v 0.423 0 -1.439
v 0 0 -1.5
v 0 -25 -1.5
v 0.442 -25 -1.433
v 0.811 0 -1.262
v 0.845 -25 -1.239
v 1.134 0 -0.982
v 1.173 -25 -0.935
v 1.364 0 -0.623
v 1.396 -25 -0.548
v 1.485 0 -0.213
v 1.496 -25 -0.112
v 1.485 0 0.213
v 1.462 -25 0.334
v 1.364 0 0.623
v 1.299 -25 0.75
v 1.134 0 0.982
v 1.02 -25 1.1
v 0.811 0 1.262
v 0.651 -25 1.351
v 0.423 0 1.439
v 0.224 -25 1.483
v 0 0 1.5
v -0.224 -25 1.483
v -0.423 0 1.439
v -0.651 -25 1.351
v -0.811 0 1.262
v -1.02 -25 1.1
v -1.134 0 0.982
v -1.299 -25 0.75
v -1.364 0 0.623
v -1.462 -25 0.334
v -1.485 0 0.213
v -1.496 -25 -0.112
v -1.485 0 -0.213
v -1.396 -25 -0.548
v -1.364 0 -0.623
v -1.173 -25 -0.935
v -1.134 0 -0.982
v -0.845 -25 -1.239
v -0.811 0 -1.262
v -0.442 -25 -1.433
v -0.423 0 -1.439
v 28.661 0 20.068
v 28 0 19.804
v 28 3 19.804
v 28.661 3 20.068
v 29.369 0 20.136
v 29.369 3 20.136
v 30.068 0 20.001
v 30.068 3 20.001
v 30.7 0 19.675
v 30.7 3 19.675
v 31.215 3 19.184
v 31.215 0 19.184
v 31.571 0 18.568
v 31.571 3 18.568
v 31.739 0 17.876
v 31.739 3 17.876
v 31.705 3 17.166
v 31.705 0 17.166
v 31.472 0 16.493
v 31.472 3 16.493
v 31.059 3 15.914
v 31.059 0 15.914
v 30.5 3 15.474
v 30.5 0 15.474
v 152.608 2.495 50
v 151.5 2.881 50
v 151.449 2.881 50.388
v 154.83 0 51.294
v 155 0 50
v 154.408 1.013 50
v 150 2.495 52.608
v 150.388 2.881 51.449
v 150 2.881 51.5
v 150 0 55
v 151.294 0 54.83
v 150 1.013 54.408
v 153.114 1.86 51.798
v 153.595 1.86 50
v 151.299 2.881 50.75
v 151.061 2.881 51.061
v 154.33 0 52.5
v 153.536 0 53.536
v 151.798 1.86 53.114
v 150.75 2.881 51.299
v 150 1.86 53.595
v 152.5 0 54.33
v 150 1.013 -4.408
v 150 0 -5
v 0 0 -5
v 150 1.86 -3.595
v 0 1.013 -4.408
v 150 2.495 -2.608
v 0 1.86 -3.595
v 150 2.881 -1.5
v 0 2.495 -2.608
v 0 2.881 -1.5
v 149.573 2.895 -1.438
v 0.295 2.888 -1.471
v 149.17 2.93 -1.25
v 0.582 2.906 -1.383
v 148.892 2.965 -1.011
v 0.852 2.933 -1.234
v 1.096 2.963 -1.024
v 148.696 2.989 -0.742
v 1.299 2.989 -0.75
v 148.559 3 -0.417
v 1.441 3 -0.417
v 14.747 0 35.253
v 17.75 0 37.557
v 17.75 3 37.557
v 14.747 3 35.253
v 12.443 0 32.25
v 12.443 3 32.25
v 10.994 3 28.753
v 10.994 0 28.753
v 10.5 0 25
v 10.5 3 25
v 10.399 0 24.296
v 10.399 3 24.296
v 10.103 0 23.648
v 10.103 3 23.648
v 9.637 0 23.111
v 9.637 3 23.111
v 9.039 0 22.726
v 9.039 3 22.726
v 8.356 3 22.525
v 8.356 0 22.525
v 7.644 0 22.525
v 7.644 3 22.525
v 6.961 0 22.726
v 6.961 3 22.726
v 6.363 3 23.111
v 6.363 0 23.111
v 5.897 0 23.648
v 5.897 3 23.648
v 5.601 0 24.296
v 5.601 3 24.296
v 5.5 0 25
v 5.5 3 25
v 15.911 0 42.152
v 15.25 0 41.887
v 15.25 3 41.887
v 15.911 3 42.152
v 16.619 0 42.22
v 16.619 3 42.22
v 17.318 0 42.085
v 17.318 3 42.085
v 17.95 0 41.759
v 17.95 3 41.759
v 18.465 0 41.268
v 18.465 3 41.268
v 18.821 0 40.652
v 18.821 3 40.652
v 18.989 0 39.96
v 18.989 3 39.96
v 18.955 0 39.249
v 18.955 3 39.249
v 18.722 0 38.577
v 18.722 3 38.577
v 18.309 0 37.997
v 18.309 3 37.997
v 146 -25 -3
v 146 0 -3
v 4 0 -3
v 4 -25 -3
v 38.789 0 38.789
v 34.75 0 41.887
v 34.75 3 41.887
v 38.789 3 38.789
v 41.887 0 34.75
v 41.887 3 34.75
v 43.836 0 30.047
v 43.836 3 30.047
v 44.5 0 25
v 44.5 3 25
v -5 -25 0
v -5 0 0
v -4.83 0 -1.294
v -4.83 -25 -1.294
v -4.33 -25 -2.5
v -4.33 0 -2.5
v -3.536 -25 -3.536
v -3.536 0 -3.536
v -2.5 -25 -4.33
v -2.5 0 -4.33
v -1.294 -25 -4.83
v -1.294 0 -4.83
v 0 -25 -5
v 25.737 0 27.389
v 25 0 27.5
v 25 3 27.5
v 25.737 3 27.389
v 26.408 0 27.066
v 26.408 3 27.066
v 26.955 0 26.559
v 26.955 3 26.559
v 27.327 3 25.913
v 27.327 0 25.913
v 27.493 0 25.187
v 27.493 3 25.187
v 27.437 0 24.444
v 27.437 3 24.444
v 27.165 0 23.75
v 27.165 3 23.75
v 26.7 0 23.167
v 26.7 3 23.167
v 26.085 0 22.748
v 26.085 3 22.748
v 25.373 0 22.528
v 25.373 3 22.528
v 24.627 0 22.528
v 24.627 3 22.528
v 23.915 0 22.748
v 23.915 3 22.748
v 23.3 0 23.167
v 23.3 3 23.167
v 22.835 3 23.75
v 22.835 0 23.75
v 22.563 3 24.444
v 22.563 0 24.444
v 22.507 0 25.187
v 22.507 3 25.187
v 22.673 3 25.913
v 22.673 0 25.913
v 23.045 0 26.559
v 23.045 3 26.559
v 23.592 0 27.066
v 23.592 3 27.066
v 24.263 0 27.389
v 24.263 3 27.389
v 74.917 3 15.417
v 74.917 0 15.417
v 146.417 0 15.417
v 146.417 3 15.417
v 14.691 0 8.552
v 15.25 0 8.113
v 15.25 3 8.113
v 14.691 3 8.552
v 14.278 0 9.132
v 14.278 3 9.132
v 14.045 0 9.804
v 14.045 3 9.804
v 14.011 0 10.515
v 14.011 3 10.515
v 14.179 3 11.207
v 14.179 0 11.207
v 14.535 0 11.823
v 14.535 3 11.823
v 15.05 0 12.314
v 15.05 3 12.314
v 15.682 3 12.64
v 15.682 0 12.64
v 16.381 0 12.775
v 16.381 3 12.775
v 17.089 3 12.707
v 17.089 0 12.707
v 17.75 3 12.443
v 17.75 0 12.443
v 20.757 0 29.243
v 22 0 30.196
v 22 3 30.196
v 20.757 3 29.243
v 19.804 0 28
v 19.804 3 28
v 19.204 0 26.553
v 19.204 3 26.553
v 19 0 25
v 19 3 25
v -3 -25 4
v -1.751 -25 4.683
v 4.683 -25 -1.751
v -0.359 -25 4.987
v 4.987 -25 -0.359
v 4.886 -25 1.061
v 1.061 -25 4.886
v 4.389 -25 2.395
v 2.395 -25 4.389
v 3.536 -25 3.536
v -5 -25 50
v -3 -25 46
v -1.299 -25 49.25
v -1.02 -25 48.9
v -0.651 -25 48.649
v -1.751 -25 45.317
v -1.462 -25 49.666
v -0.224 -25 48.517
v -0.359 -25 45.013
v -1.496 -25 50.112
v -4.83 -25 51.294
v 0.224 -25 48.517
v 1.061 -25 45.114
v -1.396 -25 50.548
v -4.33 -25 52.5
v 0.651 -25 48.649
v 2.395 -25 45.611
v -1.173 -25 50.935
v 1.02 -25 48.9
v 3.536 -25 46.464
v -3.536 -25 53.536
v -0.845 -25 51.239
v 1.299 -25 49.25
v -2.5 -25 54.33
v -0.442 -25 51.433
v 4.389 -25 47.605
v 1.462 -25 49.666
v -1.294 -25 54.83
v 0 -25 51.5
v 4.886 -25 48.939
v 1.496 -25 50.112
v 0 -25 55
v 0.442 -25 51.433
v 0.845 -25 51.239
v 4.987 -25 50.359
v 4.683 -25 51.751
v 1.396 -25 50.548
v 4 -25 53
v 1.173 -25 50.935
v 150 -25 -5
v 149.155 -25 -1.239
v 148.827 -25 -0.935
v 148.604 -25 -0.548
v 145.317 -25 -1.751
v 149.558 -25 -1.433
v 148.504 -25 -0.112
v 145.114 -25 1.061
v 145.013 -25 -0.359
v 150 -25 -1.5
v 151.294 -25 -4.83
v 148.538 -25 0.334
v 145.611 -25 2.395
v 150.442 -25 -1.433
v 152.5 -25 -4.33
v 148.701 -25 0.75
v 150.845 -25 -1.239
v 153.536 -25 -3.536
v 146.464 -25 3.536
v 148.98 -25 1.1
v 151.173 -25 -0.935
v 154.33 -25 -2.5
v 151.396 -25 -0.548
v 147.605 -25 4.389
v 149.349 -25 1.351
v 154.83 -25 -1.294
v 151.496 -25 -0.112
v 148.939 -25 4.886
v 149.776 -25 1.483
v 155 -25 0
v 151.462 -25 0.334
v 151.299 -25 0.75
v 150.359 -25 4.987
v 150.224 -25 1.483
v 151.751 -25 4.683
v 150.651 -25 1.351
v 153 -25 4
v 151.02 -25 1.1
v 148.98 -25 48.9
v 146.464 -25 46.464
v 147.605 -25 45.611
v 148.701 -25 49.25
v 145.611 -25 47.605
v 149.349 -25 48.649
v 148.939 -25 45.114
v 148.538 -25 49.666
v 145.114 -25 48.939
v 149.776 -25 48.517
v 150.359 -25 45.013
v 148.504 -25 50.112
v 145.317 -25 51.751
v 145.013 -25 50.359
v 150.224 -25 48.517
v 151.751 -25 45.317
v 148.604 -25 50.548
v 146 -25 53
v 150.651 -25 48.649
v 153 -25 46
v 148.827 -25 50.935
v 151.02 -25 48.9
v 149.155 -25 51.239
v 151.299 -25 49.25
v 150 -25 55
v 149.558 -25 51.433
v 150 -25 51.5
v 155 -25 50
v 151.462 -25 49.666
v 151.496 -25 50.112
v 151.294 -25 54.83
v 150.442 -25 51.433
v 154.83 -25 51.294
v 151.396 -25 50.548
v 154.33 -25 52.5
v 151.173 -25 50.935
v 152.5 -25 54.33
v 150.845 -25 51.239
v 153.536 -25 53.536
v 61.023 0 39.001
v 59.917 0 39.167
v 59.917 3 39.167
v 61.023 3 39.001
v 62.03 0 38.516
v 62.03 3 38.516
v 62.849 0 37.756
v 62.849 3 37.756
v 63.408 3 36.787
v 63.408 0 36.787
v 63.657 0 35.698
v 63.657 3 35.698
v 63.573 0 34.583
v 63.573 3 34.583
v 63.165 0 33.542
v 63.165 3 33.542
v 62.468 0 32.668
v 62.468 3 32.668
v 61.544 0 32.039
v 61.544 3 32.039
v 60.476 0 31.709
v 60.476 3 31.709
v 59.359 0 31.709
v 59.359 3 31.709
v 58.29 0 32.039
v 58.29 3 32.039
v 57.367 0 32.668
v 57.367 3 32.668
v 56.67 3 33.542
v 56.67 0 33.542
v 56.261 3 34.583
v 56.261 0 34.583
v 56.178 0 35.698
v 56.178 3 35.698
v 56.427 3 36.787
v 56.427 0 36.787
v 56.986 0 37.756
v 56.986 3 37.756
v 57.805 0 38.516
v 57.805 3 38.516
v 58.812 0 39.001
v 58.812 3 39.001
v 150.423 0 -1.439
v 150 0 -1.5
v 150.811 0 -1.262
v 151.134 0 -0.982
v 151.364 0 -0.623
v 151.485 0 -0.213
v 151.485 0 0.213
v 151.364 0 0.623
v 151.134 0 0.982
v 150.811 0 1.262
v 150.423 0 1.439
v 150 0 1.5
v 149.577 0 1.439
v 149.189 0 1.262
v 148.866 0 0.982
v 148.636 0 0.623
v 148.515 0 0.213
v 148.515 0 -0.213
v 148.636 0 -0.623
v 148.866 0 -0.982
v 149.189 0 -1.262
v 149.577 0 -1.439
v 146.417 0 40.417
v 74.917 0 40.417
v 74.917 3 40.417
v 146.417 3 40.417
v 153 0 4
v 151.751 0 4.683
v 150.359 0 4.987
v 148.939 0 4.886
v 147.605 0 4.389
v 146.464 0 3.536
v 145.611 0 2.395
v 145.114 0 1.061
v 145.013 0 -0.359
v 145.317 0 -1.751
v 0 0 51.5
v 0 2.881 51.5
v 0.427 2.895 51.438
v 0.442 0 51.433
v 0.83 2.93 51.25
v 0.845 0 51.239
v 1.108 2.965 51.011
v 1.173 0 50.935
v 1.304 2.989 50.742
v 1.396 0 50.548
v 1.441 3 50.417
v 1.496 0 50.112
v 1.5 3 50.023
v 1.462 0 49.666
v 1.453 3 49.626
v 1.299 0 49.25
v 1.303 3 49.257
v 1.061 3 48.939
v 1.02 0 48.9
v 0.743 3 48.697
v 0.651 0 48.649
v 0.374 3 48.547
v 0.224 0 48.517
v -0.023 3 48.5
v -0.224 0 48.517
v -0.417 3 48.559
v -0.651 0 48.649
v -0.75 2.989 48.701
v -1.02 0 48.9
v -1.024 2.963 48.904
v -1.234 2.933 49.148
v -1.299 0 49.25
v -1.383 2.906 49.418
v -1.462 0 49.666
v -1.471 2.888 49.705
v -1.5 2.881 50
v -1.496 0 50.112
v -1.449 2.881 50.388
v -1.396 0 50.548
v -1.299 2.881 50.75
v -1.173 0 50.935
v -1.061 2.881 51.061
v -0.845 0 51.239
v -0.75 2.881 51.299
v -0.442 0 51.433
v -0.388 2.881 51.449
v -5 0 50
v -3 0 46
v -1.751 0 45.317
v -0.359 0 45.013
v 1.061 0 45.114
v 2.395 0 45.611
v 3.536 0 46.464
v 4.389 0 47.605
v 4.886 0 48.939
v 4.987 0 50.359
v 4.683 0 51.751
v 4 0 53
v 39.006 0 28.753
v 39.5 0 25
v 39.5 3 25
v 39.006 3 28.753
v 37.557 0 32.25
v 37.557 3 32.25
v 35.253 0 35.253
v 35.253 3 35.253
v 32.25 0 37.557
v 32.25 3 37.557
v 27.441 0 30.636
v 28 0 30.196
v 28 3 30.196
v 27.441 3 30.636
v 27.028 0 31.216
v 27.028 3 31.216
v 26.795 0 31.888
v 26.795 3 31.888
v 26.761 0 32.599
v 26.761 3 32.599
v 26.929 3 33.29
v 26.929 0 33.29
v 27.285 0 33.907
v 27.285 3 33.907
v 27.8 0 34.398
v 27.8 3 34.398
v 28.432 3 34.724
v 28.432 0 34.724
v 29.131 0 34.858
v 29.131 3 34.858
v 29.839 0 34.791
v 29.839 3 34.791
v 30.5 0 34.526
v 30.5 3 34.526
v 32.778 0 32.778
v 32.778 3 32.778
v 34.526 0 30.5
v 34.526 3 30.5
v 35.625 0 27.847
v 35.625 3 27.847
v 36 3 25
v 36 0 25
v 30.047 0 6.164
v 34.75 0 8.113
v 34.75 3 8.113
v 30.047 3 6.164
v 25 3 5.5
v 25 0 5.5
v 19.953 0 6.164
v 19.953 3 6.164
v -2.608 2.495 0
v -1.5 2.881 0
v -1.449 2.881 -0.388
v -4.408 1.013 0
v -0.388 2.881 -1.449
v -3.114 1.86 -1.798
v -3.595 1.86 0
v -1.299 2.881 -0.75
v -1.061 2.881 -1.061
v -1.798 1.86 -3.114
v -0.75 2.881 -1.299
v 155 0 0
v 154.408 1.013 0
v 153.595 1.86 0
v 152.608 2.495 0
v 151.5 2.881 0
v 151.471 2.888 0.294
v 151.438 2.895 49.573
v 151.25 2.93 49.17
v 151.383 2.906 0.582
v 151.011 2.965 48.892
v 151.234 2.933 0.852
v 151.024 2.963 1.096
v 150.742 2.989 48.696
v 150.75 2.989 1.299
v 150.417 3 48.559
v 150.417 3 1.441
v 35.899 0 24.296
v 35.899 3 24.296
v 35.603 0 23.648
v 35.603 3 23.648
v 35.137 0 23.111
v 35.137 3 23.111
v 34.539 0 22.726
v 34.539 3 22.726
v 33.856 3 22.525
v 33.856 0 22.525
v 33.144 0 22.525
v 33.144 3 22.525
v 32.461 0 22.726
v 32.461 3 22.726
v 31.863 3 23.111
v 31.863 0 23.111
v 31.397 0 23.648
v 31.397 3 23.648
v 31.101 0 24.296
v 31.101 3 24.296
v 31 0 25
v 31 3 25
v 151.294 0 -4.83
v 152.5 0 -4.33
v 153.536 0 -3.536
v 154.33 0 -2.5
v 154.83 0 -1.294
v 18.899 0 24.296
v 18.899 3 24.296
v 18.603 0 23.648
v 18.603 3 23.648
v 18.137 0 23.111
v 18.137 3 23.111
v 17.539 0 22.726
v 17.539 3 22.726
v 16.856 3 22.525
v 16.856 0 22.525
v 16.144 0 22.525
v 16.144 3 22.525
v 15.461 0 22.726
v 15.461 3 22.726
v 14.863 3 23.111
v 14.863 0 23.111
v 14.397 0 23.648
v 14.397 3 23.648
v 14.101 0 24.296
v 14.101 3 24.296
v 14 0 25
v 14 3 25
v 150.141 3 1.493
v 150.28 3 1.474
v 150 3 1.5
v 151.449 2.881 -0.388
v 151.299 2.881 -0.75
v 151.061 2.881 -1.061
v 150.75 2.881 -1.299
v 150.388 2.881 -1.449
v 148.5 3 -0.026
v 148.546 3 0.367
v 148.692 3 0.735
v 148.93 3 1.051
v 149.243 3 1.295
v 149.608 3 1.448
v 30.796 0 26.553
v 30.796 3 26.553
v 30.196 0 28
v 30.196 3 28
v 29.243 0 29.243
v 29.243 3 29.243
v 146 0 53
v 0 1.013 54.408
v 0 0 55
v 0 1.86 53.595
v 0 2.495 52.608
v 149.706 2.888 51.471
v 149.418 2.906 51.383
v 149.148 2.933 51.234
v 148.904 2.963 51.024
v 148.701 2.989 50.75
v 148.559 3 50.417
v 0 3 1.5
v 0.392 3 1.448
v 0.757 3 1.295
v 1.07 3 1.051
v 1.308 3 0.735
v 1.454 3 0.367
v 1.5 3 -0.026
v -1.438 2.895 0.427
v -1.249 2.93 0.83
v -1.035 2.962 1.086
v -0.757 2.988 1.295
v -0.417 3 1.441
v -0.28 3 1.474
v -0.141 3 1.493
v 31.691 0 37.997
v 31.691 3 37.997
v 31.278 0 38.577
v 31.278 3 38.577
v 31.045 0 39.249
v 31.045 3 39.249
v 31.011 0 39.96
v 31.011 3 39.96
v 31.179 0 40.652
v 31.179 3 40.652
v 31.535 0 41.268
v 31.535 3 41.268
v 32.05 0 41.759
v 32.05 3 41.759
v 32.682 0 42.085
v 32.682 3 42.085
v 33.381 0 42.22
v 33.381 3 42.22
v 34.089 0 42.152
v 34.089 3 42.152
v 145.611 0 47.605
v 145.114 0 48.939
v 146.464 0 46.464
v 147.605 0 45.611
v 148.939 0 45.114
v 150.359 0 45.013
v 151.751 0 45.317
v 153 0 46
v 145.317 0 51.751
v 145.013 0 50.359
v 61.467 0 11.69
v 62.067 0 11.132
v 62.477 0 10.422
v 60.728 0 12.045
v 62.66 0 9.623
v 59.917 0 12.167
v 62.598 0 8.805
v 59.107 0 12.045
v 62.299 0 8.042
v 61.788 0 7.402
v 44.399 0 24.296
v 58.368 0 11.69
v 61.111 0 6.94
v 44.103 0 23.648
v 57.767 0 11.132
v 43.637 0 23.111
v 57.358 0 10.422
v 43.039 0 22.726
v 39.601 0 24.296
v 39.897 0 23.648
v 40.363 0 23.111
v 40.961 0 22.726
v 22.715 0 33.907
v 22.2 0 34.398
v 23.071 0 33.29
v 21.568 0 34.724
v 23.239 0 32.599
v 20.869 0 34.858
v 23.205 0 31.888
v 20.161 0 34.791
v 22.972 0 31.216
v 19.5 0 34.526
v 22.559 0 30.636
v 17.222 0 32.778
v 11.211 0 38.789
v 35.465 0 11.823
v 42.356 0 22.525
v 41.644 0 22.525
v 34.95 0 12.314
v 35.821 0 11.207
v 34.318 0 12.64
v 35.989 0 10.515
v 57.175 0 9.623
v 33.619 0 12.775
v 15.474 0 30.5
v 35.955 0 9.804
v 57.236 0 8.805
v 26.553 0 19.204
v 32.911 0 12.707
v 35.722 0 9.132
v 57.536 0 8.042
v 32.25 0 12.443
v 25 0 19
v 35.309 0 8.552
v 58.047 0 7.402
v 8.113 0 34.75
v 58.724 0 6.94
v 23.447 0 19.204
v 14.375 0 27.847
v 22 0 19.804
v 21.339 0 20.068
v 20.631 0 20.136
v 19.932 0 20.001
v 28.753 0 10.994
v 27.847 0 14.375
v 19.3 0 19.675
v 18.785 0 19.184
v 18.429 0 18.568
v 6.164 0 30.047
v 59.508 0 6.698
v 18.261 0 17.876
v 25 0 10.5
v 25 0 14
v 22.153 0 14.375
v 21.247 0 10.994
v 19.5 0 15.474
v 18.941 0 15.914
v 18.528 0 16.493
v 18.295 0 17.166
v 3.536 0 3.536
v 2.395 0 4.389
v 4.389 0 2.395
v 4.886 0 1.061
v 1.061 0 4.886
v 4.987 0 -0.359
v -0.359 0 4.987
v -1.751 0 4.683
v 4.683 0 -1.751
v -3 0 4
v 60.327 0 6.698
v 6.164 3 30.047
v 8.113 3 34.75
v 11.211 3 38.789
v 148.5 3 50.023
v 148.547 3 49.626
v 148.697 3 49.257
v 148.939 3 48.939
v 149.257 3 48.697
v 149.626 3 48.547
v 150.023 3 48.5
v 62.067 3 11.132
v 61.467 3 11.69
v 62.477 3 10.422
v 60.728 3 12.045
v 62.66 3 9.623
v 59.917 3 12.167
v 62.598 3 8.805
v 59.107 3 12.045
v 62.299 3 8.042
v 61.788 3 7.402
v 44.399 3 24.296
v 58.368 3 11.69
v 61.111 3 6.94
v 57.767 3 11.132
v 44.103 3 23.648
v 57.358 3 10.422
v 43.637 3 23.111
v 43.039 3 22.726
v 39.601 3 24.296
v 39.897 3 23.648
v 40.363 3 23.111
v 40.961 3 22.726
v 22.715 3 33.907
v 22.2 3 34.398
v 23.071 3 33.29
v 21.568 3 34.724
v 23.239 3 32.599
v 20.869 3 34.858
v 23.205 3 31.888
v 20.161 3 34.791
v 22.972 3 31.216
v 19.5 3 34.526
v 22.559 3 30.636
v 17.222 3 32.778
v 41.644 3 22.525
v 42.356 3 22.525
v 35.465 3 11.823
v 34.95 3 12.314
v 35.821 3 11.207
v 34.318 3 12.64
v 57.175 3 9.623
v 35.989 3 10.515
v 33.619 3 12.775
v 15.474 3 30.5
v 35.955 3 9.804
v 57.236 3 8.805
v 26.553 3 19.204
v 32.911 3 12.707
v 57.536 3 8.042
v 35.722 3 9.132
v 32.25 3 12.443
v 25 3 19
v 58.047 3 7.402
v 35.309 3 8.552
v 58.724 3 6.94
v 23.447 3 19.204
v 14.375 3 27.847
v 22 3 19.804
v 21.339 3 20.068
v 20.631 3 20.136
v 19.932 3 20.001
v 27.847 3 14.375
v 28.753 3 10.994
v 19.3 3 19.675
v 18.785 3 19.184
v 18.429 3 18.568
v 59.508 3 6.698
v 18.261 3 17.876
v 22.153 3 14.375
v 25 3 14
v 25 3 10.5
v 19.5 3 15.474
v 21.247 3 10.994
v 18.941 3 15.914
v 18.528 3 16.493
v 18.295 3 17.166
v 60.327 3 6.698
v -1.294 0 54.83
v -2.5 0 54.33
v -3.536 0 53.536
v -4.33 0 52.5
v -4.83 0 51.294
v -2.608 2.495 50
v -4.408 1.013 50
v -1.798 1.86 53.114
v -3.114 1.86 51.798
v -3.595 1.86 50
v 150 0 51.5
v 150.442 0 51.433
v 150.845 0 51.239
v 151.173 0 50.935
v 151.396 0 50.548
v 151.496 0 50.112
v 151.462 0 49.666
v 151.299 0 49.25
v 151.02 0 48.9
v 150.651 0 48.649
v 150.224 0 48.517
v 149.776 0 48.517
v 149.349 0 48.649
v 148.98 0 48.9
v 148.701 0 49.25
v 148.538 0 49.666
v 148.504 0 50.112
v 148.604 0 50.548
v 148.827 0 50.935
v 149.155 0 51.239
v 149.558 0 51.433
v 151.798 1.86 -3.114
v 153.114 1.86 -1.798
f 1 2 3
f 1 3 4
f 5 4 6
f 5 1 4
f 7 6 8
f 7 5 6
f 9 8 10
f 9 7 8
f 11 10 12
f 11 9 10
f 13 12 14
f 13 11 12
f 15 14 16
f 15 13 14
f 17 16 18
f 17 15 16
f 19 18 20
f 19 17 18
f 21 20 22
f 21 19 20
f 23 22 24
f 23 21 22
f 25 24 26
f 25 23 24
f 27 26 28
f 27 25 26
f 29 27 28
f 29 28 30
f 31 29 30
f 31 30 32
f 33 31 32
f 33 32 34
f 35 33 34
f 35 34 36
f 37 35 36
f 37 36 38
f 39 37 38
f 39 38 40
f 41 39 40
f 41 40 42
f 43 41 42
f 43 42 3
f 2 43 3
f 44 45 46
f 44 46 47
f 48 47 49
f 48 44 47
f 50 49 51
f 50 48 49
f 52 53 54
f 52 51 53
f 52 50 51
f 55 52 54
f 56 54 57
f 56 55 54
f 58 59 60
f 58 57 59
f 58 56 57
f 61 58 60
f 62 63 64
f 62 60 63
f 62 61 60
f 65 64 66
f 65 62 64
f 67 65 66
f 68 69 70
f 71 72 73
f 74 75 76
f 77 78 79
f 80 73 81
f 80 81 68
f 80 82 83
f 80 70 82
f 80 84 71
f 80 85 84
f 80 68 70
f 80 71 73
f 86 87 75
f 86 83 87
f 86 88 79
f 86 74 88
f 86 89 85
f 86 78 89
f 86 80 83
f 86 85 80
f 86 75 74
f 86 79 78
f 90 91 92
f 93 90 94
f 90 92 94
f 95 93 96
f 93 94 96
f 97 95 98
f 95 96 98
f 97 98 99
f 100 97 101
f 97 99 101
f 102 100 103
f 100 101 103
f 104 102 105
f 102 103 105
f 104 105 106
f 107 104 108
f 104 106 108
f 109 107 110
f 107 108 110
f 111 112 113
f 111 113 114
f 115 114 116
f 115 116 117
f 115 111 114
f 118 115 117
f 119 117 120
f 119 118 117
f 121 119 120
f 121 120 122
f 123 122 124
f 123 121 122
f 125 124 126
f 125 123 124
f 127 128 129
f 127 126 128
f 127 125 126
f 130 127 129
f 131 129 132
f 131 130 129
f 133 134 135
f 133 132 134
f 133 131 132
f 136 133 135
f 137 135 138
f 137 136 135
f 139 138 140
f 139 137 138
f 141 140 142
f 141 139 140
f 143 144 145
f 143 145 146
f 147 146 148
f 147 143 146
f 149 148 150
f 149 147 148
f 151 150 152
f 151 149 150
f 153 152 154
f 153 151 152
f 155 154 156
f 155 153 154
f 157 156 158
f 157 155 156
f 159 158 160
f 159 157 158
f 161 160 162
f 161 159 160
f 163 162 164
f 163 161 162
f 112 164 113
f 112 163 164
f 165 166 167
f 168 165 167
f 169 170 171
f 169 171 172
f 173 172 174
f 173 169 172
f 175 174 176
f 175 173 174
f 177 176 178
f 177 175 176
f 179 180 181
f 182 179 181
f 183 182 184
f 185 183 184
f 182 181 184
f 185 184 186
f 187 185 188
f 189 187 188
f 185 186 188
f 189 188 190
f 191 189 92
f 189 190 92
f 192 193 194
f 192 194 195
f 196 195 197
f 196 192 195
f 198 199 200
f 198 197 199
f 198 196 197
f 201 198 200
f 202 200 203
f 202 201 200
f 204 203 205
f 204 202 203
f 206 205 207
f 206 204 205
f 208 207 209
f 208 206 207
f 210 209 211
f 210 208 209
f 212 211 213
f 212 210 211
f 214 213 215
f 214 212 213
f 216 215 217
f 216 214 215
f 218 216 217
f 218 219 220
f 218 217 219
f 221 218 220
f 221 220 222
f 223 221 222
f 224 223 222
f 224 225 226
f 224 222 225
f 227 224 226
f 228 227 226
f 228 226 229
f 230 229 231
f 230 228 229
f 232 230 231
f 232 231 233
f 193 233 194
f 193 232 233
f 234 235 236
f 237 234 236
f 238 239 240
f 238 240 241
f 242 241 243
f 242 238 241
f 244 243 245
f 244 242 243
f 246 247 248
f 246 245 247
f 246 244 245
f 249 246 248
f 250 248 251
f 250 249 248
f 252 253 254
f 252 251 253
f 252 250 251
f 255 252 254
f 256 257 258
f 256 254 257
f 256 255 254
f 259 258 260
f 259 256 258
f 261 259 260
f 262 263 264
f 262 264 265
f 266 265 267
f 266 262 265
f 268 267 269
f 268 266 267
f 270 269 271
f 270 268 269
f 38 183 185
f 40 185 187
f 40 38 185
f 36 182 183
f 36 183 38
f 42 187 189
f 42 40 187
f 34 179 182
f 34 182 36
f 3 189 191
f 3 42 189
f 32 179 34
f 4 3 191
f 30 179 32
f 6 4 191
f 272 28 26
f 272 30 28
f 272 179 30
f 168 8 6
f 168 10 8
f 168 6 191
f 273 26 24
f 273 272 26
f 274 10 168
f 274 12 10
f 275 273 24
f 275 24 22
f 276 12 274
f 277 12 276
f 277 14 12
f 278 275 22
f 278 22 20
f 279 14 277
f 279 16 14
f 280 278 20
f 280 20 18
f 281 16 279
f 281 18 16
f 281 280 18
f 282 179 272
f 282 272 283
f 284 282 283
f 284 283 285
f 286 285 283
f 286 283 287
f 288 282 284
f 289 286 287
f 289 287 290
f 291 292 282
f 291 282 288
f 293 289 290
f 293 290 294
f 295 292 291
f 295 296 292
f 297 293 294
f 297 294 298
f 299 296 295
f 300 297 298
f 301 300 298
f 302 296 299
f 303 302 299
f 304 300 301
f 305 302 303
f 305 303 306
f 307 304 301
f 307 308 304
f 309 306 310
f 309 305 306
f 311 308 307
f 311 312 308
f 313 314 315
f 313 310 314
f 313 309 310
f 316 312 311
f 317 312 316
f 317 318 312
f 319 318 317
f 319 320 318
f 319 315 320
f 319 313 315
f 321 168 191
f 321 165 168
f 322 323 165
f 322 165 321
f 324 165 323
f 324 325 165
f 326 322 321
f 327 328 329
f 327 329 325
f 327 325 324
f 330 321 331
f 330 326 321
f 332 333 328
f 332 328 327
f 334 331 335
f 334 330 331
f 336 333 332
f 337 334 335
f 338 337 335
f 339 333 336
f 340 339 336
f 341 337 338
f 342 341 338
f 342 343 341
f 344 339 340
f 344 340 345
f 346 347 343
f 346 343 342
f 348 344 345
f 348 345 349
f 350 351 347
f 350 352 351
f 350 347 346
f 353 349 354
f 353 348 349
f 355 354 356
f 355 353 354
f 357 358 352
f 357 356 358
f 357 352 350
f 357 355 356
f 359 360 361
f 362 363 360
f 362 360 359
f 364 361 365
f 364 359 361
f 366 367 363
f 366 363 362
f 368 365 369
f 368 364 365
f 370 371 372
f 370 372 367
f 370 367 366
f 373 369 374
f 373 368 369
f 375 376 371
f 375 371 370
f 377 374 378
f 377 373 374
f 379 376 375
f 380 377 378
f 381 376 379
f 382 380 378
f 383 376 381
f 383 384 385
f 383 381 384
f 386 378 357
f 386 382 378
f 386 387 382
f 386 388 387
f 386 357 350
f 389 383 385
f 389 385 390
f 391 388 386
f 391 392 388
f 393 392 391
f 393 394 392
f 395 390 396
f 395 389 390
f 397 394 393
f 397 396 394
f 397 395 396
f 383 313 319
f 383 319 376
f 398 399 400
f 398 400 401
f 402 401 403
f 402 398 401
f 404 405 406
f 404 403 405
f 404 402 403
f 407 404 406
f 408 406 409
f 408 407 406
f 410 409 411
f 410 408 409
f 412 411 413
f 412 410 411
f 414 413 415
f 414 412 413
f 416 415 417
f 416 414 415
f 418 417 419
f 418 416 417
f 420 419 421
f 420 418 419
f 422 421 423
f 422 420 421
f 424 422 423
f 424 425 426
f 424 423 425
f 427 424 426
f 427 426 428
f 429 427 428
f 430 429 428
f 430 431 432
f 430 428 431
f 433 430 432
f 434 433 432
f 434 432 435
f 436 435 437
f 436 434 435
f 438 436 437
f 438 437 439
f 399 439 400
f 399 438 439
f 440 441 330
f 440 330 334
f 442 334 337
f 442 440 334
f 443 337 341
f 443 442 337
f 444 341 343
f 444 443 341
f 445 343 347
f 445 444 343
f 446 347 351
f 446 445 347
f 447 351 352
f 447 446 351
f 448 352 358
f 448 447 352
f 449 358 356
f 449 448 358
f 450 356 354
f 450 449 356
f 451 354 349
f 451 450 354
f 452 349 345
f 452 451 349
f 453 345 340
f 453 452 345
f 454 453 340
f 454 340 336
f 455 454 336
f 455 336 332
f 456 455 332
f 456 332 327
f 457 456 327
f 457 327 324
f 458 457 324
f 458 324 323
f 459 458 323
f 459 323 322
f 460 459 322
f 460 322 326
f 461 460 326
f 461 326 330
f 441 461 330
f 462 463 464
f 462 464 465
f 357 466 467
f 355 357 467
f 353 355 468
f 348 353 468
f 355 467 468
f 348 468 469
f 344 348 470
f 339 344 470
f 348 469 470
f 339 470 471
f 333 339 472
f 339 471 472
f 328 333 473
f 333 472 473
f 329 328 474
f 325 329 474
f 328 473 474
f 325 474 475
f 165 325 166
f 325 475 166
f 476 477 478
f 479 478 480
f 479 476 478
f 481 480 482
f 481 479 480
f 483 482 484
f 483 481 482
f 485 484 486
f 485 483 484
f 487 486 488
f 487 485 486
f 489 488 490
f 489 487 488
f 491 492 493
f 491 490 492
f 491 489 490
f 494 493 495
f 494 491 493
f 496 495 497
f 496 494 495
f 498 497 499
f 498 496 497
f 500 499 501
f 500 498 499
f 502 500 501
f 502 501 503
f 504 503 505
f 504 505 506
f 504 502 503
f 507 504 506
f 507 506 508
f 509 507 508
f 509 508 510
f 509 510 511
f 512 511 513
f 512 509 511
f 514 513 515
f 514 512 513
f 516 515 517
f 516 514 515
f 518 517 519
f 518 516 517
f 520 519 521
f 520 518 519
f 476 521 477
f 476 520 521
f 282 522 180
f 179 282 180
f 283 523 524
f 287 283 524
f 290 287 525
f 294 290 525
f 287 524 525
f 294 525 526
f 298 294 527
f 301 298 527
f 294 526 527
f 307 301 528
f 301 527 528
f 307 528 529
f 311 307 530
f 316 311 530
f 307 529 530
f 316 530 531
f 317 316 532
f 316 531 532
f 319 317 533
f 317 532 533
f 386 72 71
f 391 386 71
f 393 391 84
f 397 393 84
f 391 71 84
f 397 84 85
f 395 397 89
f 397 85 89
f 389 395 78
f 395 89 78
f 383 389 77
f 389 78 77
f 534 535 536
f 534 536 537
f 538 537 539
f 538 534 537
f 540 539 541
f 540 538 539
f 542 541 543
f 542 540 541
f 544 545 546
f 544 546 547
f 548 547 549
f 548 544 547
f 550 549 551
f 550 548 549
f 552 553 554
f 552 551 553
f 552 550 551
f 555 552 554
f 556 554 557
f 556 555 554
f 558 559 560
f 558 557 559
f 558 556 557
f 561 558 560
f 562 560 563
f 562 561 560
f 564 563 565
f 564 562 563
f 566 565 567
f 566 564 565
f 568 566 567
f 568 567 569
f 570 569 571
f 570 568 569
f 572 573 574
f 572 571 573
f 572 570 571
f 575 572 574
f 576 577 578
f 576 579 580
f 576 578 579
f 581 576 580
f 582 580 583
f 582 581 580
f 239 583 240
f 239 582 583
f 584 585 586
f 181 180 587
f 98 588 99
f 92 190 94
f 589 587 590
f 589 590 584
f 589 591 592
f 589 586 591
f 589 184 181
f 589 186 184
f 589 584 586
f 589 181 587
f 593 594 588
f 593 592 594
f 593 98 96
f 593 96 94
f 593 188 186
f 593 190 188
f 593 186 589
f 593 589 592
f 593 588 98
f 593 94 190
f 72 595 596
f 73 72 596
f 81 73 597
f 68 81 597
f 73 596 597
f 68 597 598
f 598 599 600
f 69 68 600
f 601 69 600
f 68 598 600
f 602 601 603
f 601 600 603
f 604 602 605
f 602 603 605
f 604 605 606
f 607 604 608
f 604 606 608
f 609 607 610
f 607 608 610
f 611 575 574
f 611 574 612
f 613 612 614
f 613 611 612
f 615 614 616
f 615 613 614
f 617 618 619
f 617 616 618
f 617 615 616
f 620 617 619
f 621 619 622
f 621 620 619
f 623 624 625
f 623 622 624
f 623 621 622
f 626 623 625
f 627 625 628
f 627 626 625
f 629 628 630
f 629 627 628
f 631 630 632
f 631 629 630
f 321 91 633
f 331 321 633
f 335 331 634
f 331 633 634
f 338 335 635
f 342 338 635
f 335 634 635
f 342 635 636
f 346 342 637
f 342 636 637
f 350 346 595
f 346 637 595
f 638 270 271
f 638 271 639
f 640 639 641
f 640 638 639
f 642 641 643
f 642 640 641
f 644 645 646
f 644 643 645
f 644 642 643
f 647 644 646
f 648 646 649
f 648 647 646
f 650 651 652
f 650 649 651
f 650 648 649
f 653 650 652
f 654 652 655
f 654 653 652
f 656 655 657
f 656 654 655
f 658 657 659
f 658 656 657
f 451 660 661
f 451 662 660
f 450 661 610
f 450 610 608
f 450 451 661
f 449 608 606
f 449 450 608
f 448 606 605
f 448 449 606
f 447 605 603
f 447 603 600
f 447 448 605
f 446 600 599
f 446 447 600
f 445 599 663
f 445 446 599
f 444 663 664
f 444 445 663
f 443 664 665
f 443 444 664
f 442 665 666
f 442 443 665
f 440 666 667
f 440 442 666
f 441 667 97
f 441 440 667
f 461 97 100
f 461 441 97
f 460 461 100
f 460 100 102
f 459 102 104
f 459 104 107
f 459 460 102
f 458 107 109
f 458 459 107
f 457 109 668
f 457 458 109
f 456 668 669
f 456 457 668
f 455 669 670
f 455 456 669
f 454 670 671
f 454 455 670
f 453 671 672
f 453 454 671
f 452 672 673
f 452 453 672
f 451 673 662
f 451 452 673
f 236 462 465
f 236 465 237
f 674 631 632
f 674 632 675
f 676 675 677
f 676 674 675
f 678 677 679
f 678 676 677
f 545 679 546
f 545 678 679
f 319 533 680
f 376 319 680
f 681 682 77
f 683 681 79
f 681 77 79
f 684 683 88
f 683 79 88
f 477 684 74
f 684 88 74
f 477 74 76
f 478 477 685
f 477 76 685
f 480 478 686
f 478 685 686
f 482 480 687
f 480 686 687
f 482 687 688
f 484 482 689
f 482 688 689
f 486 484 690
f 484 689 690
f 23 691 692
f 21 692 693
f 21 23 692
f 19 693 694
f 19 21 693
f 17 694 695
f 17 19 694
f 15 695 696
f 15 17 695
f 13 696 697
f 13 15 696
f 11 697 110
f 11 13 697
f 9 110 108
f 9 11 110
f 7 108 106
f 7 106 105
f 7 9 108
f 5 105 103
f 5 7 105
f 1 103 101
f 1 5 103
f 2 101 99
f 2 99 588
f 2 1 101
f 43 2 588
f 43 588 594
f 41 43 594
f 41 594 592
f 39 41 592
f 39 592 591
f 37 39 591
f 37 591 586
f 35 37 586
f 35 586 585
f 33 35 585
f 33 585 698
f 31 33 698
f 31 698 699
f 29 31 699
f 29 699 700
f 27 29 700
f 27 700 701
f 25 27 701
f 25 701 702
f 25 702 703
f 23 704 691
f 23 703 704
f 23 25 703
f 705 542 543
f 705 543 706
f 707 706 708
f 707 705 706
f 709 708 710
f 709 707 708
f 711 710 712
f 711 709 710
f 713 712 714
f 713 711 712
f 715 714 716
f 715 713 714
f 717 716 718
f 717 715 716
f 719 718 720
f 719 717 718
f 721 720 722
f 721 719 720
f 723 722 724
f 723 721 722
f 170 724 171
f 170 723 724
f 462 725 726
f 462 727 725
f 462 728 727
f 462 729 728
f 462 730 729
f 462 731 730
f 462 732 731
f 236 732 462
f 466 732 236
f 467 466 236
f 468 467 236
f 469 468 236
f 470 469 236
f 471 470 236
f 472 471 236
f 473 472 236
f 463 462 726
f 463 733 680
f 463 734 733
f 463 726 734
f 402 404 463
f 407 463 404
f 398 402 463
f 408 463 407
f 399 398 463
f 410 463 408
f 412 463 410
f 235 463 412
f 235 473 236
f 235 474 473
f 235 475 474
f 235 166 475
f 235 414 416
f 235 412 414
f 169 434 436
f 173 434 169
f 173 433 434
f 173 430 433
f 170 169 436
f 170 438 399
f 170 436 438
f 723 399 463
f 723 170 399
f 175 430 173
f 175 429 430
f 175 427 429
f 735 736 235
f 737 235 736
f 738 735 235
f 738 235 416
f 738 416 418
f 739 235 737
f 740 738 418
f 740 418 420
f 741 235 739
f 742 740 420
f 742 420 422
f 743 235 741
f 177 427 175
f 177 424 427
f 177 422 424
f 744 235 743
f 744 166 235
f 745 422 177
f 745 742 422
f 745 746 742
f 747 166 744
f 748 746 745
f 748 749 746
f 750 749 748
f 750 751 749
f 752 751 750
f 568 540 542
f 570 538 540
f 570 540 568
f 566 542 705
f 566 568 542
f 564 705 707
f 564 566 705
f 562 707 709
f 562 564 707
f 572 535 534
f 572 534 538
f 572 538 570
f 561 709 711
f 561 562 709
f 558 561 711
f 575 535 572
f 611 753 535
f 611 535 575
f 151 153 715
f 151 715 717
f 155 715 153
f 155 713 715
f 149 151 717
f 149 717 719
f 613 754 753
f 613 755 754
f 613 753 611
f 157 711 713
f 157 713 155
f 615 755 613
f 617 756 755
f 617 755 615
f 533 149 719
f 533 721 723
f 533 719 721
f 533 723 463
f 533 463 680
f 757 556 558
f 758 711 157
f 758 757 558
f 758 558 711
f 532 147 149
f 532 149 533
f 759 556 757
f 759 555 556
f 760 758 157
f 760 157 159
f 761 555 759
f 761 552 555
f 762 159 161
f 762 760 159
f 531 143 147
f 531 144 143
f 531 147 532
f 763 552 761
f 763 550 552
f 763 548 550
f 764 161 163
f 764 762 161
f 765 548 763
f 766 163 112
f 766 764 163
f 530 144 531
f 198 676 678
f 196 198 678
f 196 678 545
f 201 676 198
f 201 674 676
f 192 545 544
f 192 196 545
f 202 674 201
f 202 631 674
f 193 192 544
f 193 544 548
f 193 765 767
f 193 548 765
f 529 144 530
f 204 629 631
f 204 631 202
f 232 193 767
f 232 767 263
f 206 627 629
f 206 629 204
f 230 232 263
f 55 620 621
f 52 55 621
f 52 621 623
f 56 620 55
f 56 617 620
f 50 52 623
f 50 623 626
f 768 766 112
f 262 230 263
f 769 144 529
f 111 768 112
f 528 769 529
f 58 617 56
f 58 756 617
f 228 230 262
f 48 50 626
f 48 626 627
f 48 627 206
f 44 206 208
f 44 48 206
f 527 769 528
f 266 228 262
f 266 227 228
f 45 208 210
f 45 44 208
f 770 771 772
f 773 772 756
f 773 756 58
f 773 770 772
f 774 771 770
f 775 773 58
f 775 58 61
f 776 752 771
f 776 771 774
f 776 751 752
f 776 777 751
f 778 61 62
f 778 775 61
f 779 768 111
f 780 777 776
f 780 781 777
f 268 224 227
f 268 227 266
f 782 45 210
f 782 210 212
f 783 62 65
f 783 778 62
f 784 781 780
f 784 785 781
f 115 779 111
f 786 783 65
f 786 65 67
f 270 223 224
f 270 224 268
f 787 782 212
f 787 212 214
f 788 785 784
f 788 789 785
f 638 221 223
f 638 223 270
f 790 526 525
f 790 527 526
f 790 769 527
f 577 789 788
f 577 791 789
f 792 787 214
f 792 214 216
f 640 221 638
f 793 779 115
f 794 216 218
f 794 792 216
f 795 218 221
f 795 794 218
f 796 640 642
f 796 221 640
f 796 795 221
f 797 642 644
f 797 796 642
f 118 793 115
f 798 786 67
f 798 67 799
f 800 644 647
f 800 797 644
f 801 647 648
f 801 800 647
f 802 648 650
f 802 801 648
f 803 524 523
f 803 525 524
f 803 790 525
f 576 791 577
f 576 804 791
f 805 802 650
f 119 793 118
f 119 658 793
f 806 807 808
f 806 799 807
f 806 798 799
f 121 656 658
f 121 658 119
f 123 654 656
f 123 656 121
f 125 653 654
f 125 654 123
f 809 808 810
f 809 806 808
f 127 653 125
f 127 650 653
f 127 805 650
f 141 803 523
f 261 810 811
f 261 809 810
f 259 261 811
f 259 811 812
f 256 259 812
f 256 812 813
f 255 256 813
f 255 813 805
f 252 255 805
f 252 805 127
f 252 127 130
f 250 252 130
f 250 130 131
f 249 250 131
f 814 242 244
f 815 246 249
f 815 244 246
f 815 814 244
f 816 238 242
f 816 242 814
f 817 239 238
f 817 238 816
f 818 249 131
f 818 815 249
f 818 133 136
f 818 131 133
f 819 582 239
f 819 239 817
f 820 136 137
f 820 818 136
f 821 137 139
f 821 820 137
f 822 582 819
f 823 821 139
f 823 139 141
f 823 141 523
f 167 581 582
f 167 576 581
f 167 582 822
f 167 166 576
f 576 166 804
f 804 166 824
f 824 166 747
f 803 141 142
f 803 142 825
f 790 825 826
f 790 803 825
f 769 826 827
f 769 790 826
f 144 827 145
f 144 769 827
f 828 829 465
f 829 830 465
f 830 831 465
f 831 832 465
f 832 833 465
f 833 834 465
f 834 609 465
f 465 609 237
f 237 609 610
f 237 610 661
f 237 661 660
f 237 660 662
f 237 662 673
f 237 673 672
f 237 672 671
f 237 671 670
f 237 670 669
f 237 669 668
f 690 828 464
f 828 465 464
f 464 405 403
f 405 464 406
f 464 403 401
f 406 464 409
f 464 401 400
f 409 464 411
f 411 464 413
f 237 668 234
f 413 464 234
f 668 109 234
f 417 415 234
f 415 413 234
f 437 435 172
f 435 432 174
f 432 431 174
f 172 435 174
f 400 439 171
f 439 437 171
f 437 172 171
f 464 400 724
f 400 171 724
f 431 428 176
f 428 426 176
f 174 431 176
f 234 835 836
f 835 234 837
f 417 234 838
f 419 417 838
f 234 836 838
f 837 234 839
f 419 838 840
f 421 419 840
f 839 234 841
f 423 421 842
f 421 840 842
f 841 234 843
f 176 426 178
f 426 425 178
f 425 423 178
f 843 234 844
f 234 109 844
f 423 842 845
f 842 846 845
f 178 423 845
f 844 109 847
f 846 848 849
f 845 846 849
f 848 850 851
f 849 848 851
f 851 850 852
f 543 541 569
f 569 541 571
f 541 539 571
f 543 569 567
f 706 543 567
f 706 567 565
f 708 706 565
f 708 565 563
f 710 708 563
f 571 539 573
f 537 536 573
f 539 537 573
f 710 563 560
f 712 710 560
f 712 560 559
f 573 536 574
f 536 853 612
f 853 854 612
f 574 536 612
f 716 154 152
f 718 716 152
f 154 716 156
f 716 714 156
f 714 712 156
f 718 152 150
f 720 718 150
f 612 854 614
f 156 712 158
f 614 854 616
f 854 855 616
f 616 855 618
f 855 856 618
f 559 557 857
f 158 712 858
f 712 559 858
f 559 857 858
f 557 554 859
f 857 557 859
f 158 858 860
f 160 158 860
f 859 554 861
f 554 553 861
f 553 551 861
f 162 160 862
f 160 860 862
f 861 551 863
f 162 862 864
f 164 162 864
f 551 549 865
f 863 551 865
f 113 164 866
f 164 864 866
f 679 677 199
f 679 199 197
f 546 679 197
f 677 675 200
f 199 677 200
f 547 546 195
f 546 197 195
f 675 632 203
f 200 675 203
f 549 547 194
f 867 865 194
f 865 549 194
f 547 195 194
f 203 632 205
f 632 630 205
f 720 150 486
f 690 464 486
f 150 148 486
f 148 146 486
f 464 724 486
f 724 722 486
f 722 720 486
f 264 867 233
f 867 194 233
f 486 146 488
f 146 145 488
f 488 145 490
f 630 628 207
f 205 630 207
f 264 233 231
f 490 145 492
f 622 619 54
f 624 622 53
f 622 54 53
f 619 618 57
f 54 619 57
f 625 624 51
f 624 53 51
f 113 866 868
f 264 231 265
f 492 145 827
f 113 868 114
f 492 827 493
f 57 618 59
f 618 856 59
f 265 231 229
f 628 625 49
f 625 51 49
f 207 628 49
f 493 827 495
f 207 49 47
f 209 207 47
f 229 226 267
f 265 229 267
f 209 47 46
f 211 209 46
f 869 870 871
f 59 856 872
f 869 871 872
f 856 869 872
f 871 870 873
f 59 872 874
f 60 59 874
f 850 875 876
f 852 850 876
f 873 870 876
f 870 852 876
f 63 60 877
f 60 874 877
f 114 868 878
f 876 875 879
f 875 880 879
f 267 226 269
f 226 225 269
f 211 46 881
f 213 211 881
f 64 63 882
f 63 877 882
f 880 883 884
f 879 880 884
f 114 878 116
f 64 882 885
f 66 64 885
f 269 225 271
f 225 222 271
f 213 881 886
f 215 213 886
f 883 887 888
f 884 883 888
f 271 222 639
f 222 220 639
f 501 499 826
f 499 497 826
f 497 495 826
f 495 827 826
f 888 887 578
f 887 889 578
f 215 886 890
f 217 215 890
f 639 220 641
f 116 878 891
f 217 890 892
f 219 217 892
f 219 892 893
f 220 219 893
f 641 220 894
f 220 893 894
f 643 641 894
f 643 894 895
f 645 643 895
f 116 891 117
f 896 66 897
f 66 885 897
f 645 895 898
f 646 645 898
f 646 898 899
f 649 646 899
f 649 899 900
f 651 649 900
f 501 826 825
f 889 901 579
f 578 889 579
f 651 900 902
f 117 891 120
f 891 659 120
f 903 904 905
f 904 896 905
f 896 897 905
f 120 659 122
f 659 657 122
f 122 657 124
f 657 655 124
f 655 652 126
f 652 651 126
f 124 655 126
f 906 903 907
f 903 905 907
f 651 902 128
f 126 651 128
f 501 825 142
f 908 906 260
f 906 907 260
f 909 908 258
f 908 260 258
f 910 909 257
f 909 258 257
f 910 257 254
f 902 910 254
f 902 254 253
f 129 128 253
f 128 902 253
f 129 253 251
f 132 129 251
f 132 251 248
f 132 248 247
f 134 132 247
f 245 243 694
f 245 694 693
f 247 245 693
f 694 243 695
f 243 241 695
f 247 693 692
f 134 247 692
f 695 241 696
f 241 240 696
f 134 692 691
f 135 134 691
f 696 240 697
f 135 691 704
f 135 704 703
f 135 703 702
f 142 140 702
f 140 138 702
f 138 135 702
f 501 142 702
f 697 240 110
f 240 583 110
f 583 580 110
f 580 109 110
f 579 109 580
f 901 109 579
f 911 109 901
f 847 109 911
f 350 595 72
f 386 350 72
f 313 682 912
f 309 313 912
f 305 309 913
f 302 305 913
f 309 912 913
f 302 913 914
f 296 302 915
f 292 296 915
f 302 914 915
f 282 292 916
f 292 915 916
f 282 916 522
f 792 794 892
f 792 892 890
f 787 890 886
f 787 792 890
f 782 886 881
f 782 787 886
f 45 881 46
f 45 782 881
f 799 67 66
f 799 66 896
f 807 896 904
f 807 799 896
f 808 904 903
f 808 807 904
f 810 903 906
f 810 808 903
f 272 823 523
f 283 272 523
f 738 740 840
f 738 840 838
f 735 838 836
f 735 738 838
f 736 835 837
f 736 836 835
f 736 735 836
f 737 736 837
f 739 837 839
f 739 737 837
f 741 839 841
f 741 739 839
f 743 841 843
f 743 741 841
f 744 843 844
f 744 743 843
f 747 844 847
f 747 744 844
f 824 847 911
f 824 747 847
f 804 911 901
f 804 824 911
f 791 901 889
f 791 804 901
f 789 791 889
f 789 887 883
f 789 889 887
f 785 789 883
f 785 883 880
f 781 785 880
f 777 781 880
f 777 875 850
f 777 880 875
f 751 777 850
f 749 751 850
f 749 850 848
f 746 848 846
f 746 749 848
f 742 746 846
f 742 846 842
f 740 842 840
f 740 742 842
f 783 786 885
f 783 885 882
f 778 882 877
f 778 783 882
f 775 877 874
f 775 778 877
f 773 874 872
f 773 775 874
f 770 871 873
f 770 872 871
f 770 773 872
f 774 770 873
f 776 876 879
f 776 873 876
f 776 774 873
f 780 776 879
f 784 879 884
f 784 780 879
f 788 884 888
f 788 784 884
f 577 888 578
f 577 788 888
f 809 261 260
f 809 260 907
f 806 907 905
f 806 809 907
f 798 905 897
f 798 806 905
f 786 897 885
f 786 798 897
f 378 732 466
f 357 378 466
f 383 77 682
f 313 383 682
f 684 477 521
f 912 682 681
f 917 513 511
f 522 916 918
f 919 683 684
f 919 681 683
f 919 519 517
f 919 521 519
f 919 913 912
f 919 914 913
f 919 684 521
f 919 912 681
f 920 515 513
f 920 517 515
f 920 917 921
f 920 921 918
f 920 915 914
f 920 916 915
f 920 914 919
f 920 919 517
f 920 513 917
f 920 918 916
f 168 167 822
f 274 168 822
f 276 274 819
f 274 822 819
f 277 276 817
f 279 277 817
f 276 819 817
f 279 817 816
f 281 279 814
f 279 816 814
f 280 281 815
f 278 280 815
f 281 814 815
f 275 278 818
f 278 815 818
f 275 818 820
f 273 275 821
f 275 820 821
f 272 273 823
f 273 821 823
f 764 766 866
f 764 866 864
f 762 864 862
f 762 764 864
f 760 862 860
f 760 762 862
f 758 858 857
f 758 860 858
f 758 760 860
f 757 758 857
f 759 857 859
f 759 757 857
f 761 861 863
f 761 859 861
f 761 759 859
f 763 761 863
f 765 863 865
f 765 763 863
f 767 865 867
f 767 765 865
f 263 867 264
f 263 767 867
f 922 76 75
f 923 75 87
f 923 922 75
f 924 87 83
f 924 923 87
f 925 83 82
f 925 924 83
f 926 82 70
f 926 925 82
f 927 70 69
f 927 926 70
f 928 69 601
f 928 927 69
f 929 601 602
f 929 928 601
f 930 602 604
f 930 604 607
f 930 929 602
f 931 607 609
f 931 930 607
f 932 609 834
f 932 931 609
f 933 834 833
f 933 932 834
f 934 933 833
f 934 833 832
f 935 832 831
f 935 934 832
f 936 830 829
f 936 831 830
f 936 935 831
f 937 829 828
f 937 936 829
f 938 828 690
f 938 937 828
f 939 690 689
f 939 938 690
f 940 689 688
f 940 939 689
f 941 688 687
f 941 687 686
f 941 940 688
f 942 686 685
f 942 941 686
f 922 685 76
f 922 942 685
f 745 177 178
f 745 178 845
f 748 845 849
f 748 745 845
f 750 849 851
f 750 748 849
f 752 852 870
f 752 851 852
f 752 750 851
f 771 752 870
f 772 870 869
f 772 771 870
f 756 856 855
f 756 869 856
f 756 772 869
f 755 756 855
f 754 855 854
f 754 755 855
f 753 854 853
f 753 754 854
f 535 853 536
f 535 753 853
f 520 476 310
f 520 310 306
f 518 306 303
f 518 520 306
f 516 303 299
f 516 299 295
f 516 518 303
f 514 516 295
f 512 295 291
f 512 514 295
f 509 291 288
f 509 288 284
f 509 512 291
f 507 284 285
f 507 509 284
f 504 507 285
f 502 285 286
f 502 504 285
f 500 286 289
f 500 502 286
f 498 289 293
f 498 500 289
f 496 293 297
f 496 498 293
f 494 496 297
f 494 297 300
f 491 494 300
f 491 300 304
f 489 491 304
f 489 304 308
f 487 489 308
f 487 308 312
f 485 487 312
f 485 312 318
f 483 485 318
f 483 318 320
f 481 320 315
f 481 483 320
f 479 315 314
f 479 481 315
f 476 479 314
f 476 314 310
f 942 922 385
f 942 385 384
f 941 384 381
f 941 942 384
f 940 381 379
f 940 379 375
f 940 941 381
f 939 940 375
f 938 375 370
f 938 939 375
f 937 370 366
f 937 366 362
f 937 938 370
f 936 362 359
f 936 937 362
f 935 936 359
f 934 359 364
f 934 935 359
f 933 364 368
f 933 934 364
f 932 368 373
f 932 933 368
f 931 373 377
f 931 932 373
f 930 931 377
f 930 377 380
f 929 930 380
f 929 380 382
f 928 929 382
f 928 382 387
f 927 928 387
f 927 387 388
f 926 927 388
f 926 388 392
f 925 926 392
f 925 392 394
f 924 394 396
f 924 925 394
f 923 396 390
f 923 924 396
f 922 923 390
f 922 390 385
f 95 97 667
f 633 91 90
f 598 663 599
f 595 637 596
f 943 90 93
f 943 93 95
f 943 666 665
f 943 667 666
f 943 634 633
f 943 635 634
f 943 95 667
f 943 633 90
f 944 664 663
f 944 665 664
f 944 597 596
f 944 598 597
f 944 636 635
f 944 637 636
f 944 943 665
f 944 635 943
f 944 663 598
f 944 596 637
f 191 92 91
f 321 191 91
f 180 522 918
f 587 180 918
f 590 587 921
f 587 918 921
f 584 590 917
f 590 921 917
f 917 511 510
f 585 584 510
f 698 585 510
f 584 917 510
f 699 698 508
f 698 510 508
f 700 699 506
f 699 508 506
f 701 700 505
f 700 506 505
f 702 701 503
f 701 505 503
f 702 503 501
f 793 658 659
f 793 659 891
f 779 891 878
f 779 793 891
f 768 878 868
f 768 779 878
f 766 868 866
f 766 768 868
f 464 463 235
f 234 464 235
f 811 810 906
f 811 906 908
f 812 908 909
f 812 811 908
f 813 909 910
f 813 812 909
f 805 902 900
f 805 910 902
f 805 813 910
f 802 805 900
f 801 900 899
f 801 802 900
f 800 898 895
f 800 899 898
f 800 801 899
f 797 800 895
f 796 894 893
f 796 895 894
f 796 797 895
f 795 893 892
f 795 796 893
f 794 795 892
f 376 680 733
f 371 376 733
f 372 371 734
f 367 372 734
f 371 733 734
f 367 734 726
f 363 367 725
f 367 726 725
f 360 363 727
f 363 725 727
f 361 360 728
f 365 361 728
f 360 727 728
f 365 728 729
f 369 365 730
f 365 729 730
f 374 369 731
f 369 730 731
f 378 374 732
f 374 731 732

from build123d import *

# Parameters (mm, degrees)
BOSS_EXTRUDE1_DEPTH     = 3
FILLET1_R               = 5
CUT_EXTRUDE1_DEPTH      = 165.496200564
CUT_EXTRUDE1_DEPTH_BACK = 165.496200564
SKETCH2_R               = 1.5
CUT_EXTRUDE2_DEPTH      = 165.496200694
CUT_EXTRUDE2_DEPTH_BACK = 165.496200694
SKETCH3_R               = 2.5
CUT_EXTRUDE3_DEPTH      = 165.496200694
CUT_EXTRUDE3_DEPTH_BACK = 165.496200694
SKETCH4_R               = 3.75
SKETCH4_R_2             = 2.75
SKETCH4_W               = 71.5
SKETCH4_H               = 25
SKETCH5_R               = 1.5
BOSS_EXTRUDE2_DEPTH     = 25


with BuildPart() as part:
    # Sketch1 → Boss-Extrude1 (new body)
    with BuildSketch(Plane(origin=(0, 0, 0), x_dir=(1, 0, 0), z_dir=(0, 1, 0))):
        with BuildLine():
            Line((0, 5), (150, 5))
            ThreePointArc((150, 5), (153.535533906, 3.535533906), (155, 0))
            Line((155, 0), (155, -50))
            ThreePointArc((155, -50), (153.535533906, -53.535533906), (150, -55))
            Line((150, -55), (0, -55))
            ThreePointArc((0, -55), (-3.535533906, -53.535533906), (-5, -50))
            Line((-5, -50), (-5, 0))
            ThreePointArc((-5, 0), (-3.535533906, 3.535533906), (0, 5))
        make_face()
    extrude(amount=BOSS_EXTRUDE1_DEPTH)

    # Fillet1
    # the kernel refuses this fillet: 5 mm, written as the material it takes off along each edge
    with BuildSketch(Plane(origin=(0, 3, 50), x_dir=(0, 0, 1), z_dir=(1, 0, 0))) as fillet1_piece_1:
        with BuildLine():
            CenterArc((0.417424305, 5), FILLET1_R, 270, 66.421821522)
            Line((0.417424305, 0), (0.417424305, -0.1))
            Line((0.417424305, -0.1), (5, -0.1))
            Line((5, -0.1), (5.1, 0))
            ThreePointArc((5.1, 0), (5.1, 1.5), (5.091651514, 2.96))
            Line((5.091651514, 2.96), (5, 3))
        make_face()
    revolve(axis=Axis((0, 3, 50), (0, -1, 0)), revolution_arc=90, mode=Mode.SUBTRACT)
    with BuildSketch(Plane(origin=(-5, 3, 50), x_dir=(0, -1, 0), z_dir=(0, 0, -1)), Plane(origin=(155, 3, 0), x_dir=(0, -1, 0), z_dir=(0, 0, 1))) as fillet1_piece_2:
        with BuildLine():
            CenterArc((5, -4.582575695), FILLET1_R, 113.578178478, 66.421821522)
            Line((0, -4.582575695), (-0.1, -4.582575695))
            Line((-0.1, -4.582575695), (-0.1, 0))
            Line((-0.1, 0), (0, 0.1))
            ThreePointArc((0, 0.1), (1.5, 0.1), (2.96, 0.091651514))
            Line((2.96, 0.091651514), (3, 0))
        make_face()
    extrude(amount=50, mode=Mode.SUBTRACT)
    with BuildSketch(Plane(origin=(0, 3, 0), x_dir=(-1, 0, 0), z_dir=(0, 0, 1))) as fillet1_piece_3:
        with BuildLine():
            CenterArc((0.417424305, 5), FILLET1_R, 270, 66.421821522)
            Line((0.417424305, 0), (0.417424305, -0.1))
            Line((0.417424305, -0.1), (5, -0.1))
            Line((5, -0.1), (5.1, 0))
            ThreePointArc((5.1, 0), (5.1, 1.5), (5.091651514, 2.96))
            Line((5.091651514, 2.96), (5, 3))
        make_face()
    revolve(axis=Axis((0, 3, 0), (0, -1, 0)), revolution_arc=90, mode=Mode.SUBTRACT)
    with BuildSketch(Plane(origin=(0, 3, -5), x_dir=(0, -1, 0), z_dir=(1, 0, 0)), Plane(origin=(150, 3, 55), x_dir=(0, -1, 0), z_dir=(-1, 0, 0))) as fillet1_piece_4:
        with BuildLine():
            CenterArc((5, -4.582575695), FILLET1_R, 113.578178478, 66.421821522)
            Line((0, -4.582575695), (-0.1, -4.582575695))
            Line((-0.1, -4.582575695), (-0.1, 0))
            Line((-0.1, 0), (0, 0.1))
            ThreePointArc((0, 0.1), (1.5, 0.1), (2.96, 0.091651514))
            Line((2.96, 0.091651514), (3, 0))
        make_face()
    extrude(amount=150, mode=Mode.SUBTRACT)
    with BuildSketch(Plane(origin=(150, 3, 0), x_dir=(0, 0, -1), z_dir=(-1, 0, 0))) as fillet1_piece_5:
        with BuildLine():
            CenterArc((0.417424305, 5), FILLET1_R, 270, 66.421821522)
            Line((0.417424305, 0), (0.417424305, -0.1))
            Line((0.417424305, -0.1), (5, -0.1))
            Line((5, -0.1), (5.1, 0))
            ThreePointArc((5.1, 0), (5.1, 1.5), (5.091651514, 2.96))
            Line((5.091651514, 2.96), (5, 3))
        make_face()
    revolve(axis=Axis((150, 3, 0), (0, -1, 0)), revolution_arc=90, mode=Mode.SUBTRACT)
    with BuildSketch(Plane(origin=(150, 3, 50), x_dir=(1, 0, 0), z_dir=(0, 0, -1))) as fillet1_piece_6:
        with BuildLine():
            CenterArc((0.417424305, 5), FILLET1_R, 270, 66.421821522)
            Line((0.417424305, 0), (0.417424305, -0.1))
            Line((0.417424305, -0.1), (5, -0.1))
            Line((5, -0.1), (5.1, 0))
            ThreePointArc((5.1, 0), (5.1, 1.5), (5.091651514, 2.96))
            Line((5.091651514, 2.96), (5, 3))
        make_face()
    revolve(axis=Axis((150, 3, 50), (0, -1, 0)), revolution_arc=90, mode=Mode.SUBTRACT)

    # Sketch2 → Cut-Extrude1 (cut, two sides: drawn at the far end of the back side and taken through both)
    with BuildSketch(Plane(origin=(0, 3, 0), x_dir=(1, 0, 0), z_dir=(0, 1, 0)).offset(-CUT_EXTRUDE1_DEPTH_BACK)):
        with Locations(Location((0, -50, 0), (0, 0, 270))):
            Circle(SKETCH2_R)
        with Locations(Location((0, 0, 0), (0, 0, 270))):
            Circle(SKETCH2_R)
        with Locations(Location((150, -50, 0), (0, 0, 270))):
            Circle(SKETCH2_R)
        with Locations(Location((150, 0, 0), (0, 0, 270))):
            Circle(SKETCH2_R)
    extrude(amount=CUT_EXTRUDE1_DEPTH + CUT_EXTRUDE1_DEPTH_BACK, mode=Mode.SUBTRACT)

    # Sketch3 → Cut-Extrude2 (cut, two sides: drawn at the far end of the back side and taken through both)
    with BuildSketch(Plane(origin=(0, 3, 0), x_dir=(1, 0, 0), z_dir=(0, 1, 0)).offset(-CUT_EXTRUDE2_DEPTH_BACK)):
        with Locations(Location((25, -25, 0), (0, 0, 270))):
            Circle(SKETCH3_R)
        with BuildLine():
            ThreePointArc((30.5, -15.473720558), (25, -14), (19.5, -15.473720558))
            ThreePointArc((19.5, -15.473720558), (18.584936491, -18.888784068), (22, -19.803847577))
            ThreePointArc((22, -19.803847577), (25, -19), (28, -19.803847577))
            ThreePointArc((28, -19.803847577), (31.415063509, -18.888784068), (30.5, -15.473720558))
        make_face()
        with BuildLine():
            ThreePointArc((30.5, -34.526279442), (34.526279442, -30.5), (36, -25))
            ThreePointArc((36, -25), (33.5, -22.5), (31, -25))
            ThreePointArc((31, -25), (30.196152423, -28), (28, -30.196152423))
            ThreePointArc((28, -30.196152423), (27.084936491, -33.611215932), (30.5, -34.526279442))
        make_face()
        with BuildLine():
            ThreePointArc((14, -25), (15.473720558, -30.5), (19.5, -34.526279442))
            ThreePointArc((19.5, -34.526279442), (22.915063509, -33.611215932), (22, -30.196152423))
            ThreePointArc((22, -30.196152423), (19.803847577, -28), (19, -25))
            ThreePointArc((19, -25), (16.5, -22.5), (14, -25))
        make_face()
        with BuildLine():
            ThreePointArc((34.75, -8.112504626), (25, -5.5), (15.25, -8.112504626))
            ThreePointArc((15.25, -8.112504626), (14.334936491, -11.527568136), (17.75, -12.442631645))
            ThreePointArc((17.75, -12.442631645), (25, -10.5), (32.25, -12.442631645))
            ThreePointArc((32.25, -12.442631645), (35.665063509, -11.527568136), (34.75, -8.112504626))
        make_face()
        with BuildLine():
            ThreePointArc((34.75, -41.887495374), (41.887495374, -34.75), (44.5, -25))
            ThreePointArc((44.5, -25), (42, -22.5), (39.5, -25))
            ThreePointArc((39.5, -25), (37.557368355, -32.25), (32.25, -37.557368355))
            ThreePointArc((32.25, -37.557368355), (31.334936491, -40.972431864), (34.75, -41.887495374))
        make_face()
        with BuildLine():
            ThreePointArc((5.5, -25), (8.112504626, -34.75), (15.25, -41.887495374))
            ThreePointArc((15.25, -41.887495374), (18.665063509, -40.972431864), (17.75, -37.557368355))
            ThreePointArc((17.75, -37.557368355), (12.442631645, -32.25), (10.5, -25))
            ThreePointArc((10.5, -25), (8, -22.5), (5.5, -25))
        make_face()
    extrude(amount=CUT_EXTRUDE2_DEPTH + CUT_EXTRUDE2_DEPTH_BACK, mode=Mode.SUBTRACT)

    # Sketch4 → Cut-Extrude3 (cut, two sides: drawn at the far end of the back side and taken through both)
    with BuildSketch(Plane(origin=(0, 3, 0), x_dir=(1, 0, 0), z_dir=(0, 1, 0)).offset(-CUT_EXTRUDE3_DEPTH_BACK)):
        with Locations(Location((59.917424305, -35.417424305, 0), (0, 0, 270))):
            Circle(SKETCH4_R)
        with Locations(Location((59.917424305, -9.417424305, 0), (0, 0, 270))):
            Circle(SKETCH4_R_2)
        with Locations((110.667424305, -27.917424305)):
            Rectangle(SKETCH4_W, SKETCH4_H)
    extrude(amount=CUT_EXTRUDE3_DEPTH + CUT_EXTRUDE3_DEPTH_BACK, mode=Mode.SUBTRACT)

    # Sketch5 → Boss-Extrude2 (add)
    with BuildSketch(Plane.XZ):
        with BuildLine():
            Line((155, 0), (155, 50))
            ThreePointArc((155, 50), (153.535533906, 53.535533906), (150, 55))
            Line((150, 55), (0, 55))
            ThreePointArc((0, 55), (-3.535533906, 53.535533906), (-5, 50))
            Line((-5, 50), (-5, 0))
            ThreePointArc((-5, 0), (-3.535533906, -3.535533906), (0, -5))
            Line((0, -5), (150, -5))
            ThreePointArc((150, -5), (153.535533906, -3.535533906), (155, 0))
        make_face()
        with Locations(Location((0, 50, 0), (0, 0, 90))):
            Circle(SKETCH5_R, mode=Mode.SUBTRACT)
        with Locations(Location((0, 0, 0), (0, 0, 270))):
            Circle(SKETCH5_R, mode=Mode.SUBTRACT)
        with Locations(Location((150, 0, 0), (0, 0, 270))):
            Circle(SKETCH5_R, mode=Mode.SUBTRACT)
        with Locations(Location((150, 50, 0), (0, 0, 90))):
            Circle(SKETCH5_R, mode=Mode.SUBTRACT)
        with BuildLine():
            Line((4, 53), (146, 53))
            ThreePointArc((146, 53), (146.464466094, 46.464466094), (153, 46))
            Line((153, 46), (153, 4))
            ThreePointArc((153, 4), (146.464466094, 3.535533906), (146, -3))
            Line((146, -3), (4, -3))
            ThreePointArc((4, -3), (3.535533906, 3.535533906), (-3, 4))
            Line((-3, 4), (-3, 46))
            ThreePointArc((-3, 46), (3.535533906, 46.464466094), (4, 53))
        make_face(mode=Mode.SUBTRACT)
    extrude(amount=BOSS_EXTRUDE2_DEPTH)


solid = part.part
